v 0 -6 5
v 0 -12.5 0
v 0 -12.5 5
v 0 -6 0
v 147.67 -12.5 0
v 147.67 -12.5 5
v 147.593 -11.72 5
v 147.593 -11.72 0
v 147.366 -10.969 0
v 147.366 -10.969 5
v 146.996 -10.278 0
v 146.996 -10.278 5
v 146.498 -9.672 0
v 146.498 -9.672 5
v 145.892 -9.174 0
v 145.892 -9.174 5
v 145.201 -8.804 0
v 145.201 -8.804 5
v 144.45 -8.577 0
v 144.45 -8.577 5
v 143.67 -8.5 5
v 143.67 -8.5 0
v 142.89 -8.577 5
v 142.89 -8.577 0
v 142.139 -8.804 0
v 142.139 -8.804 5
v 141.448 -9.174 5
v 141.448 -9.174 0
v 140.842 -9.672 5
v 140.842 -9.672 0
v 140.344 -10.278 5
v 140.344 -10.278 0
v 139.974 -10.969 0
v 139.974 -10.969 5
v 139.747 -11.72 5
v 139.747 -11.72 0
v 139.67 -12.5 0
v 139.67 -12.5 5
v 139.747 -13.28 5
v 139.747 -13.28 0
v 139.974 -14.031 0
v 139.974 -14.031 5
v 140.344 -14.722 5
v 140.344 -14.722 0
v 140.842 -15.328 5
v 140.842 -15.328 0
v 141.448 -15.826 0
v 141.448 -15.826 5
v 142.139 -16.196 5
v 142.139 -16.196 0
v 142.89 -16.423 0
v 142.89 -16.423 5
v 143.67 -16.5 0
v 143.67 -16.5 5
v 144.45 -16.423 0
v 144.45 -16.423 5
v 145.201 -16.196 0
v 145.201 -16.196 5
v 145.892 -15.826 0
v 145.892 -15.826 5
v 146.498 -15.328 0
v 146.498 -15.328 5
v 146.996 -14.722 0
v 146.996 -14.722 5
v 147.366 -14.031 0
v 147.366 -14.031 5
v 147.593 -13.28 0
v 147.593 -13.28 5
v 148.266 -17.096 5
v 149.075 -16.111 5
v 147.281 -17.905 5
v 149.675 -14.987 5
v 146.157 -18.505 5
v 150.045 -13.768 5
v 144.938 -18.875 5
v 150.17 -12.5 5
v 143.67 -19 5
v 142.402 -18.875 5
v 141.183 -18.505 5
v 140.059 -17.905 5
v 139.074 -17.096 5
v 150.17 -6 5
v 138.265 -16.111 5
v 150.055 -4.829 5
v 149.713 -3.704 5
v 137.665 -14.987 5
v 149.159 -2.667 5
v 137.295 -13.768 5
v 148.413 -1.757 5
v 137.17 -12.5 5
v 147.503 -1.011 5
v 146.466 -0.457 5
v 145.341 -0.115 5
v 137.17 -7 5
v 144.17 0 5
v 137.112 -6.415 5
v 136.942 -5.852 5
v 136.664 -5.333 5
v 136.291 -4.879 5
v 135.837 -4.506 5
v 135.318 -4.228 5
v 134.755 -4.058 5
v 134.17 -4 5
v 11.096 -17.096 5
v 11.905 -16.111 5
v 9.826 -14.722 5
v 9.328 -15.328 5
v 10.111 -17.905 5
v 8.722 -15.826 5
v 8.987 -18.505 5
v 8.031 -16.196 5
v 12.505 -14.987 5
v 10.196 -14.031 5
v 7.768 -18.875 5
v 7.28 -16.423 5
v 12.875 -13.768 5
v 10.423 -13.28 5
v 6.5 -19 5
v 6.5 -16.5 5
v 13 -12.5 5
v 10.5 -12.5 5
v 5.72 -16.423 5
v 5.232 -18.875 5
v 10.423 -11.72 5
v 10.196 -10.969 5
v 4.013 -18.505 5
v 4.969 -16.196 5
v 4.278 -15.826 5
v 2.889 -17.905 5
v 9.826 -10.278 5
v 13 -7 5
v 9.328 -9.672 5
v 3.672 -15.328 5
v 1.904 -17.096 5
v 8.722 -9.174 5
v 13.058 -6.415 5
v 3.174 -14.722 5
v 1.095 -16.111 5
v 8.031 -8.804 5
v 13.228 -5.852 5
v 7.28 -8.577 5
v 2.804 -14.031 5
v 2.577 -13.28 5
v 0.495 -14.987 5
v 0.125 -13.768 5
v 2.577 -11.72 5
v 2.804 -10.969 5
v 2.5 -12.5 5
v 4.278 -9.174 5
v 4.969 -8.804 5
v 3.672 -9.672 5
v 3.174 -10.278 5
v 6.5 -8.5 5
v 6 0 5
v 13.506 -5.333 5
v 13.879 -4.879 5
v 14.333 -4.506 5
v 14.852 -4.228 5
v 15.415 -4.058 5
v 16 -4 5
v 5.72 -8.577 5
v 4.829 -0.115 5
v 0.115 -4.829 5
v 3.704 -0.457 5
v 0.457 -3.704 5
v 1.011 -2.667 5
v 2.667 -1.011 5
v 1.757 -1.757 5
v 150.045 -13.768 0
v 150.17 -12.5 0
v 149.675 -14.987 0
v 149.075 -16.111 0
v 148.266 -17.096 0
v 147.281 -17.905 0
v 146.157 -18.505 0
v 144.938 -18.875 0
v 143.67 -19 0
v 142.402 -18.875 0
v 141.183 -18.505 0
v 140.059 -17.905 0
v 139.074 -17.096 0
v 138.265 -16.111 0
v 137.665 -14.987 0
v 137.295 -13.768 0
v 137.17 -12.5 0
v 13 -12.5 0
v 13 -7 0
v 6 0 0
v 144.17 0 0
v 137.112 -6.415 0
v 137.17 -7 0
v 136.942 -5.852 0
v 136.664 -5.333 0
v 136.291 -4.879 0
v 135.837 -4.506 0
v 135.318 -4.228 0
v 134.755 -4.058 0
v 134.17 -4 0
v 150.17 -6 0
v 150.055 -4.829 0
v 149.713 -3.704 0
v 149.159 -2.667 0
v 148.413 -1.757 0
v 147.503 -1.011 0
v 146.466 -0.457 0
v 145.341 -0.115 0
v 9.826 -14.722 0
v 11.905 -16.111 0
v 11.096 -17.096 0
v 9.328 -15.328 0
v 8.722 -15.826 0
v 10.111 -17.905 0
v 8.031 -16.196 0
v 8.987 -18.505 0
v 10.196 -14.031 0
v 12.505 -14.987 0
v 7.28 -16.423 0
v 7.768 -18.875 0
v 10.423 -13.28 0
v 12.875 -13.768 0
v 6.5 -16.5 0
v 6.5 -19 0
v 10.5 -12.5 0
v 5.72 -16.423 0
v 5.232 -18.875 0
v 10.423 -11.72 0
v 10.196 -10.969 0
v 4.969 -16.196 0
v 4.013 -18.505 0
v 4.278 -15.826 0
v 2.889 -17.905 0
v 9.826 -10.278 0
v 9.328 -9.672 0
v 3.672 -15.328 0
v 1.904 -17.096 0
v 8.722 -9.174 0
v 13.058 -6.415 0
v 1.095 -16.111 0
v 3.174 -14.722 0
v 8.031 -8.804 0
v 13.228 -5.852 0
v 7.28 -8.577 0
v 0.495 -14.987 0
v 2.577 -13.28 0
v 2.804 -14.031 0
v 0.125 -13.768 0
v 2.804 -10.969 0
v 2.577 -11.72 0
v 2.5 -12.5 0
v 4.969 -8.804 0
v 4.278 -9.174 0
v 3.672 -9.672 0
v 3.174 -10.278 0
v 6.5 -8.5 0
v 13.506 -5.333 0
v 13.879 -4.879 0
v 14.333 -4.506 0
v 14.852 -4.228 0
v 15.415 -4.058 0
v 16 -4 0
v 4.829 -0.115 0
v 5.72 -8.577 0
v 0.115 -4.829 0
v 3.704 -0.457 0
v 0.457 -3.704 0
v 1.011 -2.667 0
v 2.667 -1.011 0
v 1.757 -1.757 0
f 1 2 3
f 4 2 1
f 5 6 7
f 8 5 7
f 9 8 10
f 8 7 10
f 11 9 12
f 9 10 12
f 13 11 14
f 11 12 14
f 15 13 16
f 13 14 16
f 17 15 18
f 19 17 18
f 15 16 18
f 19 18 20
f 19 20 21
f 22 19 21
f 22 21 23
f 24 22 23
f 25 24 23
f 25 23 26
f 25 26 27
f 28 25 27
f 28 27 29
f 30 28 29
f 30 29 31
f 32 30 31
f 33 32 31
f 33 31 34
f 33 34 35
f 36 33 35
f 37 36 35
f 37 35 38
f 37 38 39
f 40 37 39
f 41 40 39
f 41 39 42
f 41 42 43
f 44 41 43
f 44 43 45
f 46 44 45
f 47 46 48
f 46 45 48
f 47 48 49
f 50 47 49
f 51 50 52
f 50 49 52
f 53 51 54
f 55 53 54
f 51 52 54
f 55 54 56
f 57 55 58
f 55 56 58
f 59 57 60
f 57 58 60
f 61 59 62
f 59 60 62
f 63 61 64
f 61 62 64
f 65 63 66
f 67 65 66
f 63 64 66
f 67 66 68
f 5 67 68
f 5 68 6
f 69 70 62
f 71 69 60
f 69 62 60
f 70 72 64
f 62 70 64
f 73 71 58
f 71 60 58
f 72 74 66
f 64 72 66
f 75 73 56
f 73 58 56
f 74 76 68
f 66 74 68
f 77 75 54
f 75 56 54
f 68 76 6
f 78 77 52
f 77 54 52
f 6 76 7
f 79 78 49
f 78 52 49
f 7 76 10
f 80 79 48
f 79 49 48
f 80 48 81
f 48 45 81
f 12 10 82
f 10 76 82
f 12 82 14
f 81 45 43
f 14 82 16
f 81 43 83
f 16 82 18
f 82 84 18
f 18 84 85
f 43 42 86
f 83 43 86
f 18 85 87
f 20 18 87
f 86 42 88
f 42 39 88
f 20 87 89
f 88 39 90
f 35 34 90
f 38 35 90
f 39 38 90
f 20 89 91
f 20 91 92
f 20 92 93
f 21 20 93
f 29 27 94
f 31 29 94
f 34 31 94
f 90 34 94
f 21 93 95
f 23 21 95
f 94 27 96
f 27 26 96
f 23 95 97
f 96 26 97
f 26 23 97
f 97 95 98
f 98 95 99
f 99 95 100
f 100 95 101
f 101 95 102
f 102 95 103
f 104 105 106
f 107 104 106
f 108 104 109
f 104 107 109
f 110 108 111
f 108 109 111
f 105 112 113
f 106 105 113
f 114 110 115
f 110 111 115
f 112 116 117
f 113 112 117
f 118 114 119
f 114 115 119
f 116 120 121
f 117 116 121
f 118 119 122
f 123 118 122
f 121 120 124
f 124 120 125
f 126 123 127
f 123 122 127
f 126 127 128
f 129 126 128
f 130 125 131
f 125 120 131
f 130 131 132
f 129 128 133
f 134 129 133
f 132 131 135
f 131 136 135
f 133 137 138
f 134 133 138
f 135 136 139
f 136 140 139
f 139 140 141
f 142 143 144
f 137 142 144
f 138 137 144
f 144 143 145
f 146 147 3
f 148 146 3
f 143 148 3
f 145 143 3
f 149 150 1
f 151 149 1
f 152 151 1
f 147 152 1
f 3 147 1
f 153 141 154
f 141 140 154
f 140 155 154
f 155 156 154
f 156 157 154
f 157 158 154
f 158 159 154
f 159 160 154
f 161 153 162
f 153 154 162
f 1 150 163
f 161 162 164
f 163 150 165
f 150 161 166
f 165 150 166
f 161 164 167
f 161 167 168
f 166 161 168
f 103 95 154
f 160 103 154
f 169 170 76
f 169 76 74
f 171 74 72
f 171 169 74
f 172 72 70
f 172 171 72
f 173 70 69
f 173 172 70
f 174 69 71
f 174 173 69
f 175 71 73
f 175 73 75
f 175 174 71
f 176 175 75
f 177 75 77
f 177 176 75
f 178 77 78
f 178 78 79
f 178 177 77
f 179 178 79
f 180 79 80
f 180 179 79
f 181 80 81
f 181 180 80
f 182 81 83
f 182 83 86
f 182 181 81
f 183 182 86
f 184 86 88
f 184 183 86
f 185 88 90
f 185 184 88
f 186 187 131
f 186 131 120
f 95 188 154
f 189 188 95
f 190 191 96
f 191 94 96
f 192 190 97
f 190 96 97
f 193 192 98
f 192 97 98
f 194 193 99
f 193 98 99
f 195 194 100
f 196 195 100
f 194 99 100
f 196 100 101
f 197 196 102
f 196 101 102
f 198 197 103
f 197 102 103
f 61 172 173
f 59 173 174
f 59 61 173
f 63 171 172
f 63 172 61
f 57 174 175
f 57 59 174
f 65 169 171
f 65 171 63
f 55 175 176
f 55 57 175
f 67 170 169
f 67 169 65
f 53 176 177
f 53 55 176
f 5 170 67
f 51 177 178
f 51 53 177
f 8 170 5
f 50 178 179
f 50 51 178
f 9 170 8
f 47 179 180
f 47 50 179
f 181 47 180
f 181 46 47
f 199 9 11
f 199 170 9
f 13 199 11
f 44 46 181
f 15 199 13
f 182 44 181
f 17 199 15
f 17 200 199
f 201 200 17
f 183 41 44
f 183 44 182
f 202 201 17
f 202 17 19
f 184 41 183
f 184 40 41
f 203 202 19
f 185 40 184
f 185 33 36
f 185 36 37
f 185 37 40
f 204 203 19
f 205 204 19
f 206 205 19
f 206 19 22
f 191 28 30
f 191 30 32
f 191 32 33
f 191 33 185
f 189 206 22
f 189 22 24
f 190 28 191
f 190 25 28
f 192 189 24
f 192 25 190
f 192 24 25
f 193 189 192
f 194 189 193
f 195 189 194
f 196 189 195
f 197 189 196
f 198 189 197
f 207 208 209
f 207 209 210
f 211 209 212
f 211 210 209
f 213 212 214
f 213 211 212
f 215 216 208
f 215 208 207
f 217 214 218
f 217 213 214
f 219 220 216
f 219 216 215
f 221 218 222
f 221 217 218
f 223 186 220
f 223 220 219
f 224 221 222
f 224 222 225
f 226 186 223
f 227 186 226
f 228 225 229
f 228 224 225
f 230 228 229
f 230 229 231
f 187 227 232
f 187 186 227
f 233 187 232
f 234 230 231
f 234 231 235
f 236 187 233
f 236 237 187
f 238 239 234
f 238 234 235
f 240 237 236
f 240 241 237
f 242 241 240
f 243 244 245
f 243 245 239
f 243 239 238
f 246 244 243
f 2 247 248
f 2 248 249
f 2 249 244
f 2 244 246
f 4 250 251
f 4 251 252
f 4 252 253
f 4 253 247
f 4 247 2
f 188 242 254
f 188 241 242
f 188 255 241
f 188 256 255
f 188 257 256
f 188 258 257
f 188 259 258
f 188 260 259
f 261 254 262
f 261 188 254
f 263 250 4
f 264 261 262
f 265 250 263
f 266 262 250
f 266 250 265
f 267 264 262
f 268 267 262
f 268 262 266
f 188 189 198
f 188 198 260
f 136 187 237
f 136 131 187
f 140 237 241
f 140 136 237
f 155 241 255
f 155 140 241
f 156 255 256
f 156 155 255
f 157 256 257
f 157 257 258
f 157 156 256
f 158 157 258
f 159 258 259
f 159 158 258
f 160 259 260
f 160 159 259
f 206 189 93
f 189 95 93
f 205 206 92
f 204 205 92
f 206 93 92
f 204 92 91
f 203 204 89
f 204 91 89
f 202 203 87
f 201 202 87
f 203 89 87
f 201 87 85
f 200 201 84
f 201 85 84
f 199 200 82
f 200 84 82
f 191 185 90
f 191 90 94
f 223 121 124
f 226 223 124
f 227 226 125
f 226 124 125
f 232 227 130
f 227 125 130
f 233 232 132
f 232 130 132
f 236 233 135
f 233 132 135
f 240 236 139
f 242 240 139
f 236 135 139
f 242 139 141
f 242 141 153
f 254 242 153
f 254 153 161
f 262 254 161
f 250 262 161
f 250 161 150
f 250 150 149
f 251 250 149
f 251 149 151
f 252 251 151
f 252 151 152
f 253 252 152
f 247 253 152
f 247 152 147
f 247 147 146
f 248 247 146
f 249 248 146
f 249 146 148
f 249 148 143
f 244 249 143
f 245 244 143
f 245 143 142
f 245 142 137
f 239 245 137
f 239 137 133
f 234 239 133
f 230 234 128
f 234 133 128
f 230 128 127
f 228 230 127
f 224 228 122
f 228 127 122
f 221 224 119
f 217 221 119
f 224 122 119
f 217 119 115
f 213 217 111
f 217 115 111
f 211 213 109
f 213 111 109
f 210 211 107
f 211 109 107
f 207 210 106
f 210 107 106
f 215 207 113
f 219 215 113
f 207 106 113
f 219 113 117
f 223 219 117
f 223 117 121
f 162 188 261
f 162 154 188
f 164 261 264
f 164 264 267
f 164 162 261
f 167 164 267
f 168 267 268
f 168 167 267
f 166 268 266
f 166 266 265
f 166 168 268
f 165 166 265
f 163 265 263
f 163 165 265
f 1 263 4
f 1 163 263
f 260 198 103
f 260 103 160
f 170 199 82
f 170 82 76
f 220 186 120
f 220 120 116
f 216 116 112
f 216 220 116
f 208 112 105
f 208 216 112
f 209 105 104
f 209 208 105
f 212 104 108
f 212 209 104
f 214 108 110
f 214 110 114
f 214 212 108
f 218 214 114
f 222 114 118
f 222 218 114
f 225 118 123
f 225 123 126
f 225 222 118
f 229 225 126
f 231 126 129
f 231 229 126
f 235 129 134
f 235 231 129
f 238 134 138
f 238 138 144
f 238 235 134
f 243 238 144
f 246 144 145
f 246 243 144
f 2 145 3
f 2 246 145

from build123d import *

# Parameters (mm, degrees)
BOSS_EXTRUDE1_DEPTH = 5
SKETCH2_R           = 4
CUT_EXTRUDE1_DEPTH  = 152.449757015
FILLET1_R           = 6
FILLET2_R           = 3


with BuildPart() as part:
    # Sketch1 → Boss-Extrude1 (new body)
    with BuildSketch(Plane.XY):
        with BuildLine():
            Line((0, 0), (130.17, 0))
            Line((130.17, 0), (150.17, 0))
            Line((150.17, 0), (150.17, -4))
            Line((150.17, -4), (150.17, -12.5))
            ThreePointArc((150.17, -12.5), (143.67, -19), (137.17, -12.5))
            Line((137.17, -12.5), (137.17, -4))
            Line((137.17, -4), (13, -4))
            Line((13, -4), (13, -12.5))
            ThreePointArc((13, -12.5), (6.5, -19), (0, -12.5))
            Line((0, -12.5), (0, -4))
            Line((0, -4), (0, 0))
        make_face()
    extrude(amount=BOSS_EXTRUDE1_DEPTH)

    # Sketch2 → Cut-Extrude1 (cut, through all)
    with BuildSketch(Plane.XY.offset(5)):
        with Locations((6.5, -12.5)):
            Circle(SKETCH2_R)
        with Locations((143.67, -12.5)):
            Circle(SKETCH2_R)
    extrude(amount=-CUT_EXTRUDE1_DEPTH, mode=Mode.SUBTRACT)

    # Fillet1
    fillet1_edges = [part.edges().sort_by_distance(p)[0] for p in [
        (0, 0, 2.5),
        (150.17, 0, 2.5),
    ]]
    fillet(fillet1_edges, radius=FILLET1_R)

    # Fillet2
    fillet2_edges = [part.edges().sort_by_distance(p)[0] for p in [
        (137.17, -4, 2.5),
        (13, -4, 2.5),
    ]]
    fillet(fillet2_edges, radius=FILLET2_R)


solid = part.part
